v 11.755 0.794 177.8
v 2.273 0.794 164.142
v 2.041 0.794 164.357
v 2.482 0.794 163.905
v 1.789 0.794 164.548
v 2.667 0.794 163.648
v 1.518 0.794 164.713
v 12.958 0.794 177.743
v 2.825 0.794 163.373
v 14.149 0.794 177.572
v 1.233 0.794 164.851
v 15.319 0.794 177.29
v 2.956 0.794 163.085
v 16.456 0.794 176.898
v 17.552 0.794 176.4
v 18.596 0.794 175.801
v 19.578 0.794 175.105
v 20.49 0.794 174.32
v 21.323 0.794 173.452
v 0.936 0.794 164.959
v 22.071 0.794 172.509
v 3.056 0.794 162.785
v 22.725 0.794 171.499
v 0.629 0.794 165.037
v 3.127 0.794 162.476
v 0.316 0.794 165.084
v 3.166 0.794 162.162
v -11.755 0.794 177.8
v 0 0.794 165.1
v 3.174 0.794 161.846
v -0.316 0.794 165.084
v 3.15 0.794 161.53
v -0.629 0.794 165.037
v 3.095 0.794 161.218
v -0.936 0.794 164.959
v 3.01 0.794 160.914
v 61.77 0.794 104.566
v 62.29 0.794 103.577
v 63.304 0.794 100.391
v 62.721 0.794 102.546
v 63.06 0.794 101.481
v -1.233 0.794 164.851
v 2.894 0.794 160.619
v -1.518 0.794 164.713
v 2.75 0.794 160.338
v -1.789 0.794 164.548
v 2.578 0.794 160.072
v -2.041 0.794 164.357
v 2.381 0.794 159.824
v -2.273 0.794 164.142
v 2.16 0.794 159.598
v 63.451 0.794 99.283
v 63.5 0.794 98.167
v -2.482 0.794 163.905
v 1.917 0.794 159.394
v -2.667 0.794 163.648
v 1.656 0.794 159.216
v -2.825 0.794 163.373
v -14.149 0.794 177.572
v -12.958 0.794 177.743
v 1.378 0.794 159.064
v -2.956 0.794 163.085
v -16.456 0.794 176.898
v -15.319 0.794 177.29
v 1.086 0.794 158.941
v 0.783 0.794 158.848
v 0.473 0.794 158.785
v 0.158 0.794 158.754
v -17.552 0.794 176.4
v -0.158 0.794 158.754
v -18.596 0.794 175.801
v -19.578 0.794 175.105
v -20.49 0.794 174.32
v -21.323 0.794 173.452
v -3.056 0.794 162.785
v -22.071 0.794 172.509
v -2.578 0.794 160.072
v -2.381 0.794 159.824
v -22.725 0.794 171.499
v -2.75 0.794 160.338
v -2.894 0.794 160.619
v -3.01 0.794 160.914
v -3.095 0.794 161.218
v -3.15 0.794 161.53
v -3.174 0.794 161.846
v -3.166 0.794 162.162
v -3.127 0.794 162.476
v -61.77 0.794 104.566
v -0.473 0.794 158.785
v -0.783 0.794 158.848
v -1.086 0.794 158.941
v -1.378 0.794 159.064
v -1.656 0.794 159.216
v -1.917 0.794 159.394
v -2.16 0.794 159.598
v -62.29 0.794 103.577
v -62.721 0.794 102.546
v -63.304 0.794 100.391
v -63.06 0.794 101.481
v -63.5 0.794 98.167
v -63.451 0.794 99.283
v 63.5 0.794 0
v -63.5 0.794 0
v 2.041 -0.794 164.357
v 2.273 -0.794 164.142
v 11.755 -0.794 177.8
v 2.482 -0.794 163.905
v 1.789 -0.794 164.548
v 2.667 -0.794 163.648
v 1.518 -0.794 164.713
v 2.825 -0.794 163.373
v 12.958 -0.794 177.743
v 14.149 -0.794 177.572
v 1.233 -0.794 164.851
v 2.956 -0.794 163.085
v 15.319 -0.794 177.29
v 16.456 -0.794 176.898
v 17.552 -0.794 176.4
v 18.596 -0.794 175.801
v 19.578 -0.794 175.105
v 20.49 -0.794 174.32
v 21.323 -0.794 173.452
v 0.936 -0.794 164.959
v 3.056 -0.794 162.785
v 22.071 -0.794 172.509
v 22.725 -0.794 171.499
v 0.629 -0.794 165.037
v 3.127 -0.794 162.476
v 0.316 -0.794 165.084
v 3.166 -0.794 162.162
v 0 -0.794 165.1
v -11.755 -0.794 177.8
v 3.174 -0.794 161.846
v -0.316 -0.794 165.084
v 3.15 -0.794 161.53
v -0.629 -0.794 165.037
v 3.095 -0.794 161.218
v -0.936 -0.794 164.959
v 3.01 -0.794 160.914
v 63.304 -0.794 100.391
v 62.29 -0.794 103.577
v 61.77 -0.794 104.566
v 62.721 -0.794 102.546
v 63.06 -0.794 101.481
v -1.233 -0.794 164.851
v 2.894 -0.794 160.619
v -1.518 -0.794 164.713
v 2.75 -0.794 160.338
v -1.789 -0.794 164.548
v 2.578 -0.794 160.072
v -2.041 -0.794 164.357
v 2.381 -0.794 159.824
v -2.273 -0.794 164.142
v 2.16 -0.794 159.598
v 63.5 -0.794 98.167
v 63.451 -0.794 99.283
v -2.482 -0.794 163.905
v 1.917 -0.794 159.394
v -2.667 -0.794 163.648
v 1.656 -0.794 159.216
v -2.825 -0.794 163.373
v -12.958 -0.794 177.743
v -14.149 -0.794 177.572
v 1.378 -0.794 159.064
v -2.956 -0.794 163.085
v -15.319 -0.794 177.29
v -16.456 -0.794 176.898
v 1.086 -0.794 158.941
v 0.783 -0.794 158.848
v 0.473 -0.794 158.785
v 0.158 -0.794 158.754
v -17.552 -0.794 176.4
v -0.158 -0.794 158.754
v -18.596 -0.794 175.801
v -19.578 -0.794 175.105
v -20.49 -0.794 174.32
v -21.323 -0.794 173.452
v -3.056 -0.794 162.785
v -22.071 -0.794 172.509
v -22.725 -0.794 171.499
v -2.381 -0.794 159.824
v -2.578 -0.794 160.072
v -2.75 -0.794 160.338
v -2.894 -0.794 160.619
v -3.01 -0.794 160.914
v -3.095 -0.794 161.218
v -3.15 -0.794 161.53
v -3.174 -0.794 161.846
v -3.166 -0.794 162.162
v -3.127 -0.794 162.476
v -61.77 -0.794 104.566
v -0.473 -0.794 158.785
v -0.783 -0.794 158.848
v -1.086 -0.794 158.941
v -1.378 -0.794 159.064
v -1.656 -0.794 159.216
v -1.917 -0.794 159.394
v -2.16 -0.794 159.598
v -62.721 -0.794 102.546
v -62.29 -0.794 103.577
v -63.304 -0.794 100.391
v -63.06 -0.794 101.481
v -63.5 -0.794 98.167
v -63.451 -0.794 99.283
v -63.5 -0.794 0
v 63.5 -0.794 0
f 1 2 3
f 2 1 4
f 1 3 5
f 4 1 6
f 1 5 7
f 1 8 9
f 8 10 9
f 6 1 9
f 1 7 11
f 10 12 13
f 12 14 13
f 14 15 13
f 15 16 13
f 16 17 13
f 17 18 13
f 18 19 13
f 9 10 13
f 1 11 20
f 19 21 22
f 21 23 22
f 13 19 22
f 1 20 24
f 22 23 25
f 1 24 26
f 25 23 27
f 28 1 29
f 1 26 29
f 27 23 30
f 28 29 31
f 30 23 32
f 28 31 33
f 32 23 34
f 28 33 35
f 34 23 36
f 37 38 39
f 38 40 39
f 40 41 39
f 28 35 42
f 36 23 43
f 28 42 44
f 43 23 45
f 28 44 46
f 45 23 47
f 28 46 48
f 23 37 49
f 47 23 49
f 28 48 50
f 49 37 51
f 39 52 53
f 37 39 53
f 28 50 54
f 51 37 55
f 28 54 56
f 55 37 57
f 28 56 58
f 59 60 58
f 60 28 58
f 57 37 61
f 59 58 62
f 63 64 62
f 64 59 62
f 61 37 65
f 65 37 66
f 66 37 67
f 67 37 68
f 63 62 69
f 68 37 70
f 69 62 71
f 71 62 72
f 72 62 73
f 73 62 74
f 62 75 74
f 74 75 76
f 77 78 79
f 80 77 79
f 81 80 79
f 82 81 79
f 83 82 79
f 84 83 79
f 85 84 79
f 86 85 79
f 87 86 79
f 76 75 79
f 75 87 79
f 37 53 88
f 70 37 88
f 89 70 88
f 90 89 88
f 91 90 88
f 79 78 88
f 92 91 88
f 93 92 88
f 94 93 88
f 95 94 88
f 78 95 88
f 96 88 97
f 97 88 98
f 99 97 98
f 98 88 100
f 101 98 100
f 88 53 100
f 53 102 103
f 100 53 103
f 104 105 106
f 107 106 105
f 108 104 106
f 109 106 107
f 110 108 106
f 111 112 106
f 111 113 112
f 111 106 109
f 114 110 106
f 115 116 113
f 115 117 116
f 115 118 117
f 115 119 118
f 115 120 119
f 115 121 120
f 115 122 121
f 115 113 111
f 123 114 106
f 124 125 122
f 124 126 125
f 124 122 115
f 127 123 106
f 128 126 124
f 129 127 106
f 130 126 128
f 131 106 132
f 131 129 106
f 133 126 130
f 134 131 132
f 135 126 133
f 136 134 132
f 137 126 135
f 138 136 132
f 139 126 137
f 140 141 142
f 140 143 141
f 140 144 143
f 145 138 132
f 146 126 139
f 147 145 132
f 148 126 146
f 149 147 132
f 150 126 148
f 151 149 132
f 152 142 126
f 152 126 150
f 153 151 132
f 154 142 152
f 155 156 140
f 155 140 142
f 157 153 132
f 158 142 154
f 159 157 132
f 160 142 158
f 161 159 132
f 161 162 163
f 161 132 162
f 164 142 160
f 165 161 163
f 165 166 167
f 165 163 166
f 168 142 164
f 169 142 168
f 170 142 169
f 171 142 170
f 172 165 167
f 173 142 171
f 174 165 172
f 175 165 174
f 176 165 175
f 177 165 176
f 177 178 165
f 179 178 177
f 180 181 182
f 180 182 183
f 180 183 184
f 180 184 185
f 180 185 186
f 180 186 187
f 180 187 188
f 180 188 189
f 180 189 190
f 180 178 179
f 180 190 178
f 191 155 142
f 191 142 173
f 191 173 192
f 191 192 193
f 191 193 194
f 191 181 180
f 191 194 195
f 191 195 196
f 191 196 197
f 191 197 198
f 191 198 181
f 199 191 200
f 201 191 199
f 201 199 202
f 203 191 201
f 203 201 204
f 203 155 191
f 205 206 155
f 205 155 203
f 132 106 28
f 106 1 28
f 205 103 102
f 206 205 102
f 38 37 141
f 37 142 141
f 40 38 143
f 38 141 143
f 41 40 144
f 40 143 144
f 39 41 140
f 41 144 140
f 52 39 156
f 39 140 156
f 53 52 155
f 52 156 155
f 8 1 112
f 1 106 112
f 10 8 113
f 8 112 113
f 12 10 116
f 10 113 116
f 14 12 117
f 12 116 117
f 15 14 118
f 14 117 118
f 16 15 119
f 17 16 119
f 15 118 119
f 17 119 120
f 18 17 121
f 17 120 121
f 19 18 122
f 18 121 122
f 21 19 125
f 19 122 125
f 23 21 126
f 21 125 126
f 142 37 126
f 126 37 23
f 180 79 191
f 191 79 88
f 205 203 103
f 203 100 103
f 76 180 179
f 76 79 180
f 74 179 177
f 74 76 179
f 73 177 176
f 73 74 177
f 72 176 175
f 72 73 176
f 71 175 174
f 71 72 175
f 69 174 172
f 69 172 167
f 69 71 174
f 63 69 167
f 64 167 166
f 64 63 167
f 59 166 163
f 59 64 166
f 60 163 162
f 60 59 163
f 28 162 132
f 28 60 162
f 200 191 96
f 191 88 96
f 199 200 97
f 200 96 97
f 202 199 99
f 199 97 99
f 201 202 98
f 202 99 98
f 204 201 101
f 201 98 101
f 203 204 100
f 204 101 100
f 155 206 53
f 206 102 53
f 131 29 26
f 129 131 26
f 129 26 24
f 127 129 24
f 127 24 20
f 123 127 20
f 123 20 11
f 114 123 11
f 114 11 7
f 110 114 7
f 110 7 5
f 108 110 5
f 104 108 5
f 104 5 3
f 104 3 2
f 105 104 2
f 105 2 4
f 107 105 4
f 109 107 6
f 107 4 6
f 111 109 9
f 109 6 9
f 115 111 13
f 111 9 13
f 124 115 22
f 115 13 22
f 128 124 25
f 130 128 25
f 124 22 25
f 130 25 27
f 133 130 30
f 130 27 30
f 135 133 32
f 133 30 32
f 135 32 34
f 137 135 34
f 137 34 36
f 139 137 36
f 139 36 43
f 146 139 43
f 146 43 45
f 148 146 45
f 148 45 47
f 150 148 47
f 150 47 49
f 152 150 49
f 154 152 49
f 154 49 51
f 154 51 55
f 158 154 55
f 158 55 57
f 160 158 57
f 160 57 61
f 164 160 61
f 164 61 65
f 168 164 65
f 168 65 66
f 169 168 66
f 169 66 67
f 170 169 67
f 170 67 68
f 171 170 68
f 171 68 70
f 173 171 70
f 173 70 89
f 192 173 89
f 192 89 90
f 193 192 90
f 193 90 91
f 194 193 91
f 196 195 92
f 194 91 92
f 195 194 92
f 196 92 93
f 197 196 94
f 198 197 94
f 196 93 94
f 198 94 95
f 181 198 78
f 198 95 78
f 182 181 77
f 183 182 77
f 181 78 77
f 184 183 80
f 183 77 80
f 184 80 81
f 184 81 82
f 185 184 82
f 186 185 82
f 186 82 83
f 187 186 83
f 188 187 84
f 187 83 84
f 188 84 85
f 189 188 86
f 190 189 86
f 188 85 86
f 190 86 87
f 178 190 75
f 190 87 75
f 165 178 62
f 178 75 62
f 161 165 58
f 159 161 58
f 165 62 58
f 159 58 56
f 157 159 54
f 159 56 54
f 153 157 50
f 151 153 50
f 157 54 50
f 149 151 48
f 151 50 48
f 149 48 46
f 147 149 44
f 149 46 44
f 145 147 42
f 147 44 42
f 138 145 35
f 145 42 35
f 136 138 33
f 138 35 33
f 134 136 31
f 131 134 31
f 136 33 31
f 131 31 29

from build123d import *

# Parameters (mm, degrees)
BOSS_EXTRUDE1_DEPTH = 0.79375
FILLET1_R           = 12.7
CUT_EXTRUDE1_REACH  = 190.806
SKETCH2_R           = 3.175


with BuildPart() as part:
    # Sketch1 → Boss-Extrude1 (new, symmetric)
    with BuildSketch(Plane(origin=(0, 0, 0), x_dir=(1, 0, 0), z_dir=(0, 1, 0))):
        Polygon((-63.5, 0), (63.5, 0), (63.5, -101.6), (19.05, -177.8), (-19.05, -177.8), (-63.5, -101.6), align=None)
    extrude(amount=BOSS_EXTRUDE1_DEPTH, both=True)

    # Fillet1
    fillet1_edges = [part.edges().sort_by_distance(p)[0] for p in [
        (19.05, 0, 177.8),
        (-19.05, 0, 177.8),
        (-63.5, 0, 101.6),
        (63.5, 0, 101.6),
    ]]
    fillet(fillet1_edges, radius=FILLET1_R)

    # Sketch2 → Cut-Extrude1 (cut, up to next)
    with BuildSketch(Plane(origin=(0, 0.79375, 0), x_dir=(1, 0, 0), z_dir=(0, 1, 0)), mode=Mode.PRIVATE) as cut_extrude1_sk1:
        with Locations(Location((0, -161.925, 0), (0, 0, 270))):
            Circle(SKETCH2_R)
    cut_extrude1_tool1 = extrude(cut_extrude1_sk1.sketch, amount=-CUT_EXTRUDE1_REACH, mode=Mode.PRIVATE) & part.part
    add(cut_extrude1_tool1.solids().sort_by_distance((0, 0.79375, 161.925))[0], mode=Mode.SUBTRACT)


solid = part.part
